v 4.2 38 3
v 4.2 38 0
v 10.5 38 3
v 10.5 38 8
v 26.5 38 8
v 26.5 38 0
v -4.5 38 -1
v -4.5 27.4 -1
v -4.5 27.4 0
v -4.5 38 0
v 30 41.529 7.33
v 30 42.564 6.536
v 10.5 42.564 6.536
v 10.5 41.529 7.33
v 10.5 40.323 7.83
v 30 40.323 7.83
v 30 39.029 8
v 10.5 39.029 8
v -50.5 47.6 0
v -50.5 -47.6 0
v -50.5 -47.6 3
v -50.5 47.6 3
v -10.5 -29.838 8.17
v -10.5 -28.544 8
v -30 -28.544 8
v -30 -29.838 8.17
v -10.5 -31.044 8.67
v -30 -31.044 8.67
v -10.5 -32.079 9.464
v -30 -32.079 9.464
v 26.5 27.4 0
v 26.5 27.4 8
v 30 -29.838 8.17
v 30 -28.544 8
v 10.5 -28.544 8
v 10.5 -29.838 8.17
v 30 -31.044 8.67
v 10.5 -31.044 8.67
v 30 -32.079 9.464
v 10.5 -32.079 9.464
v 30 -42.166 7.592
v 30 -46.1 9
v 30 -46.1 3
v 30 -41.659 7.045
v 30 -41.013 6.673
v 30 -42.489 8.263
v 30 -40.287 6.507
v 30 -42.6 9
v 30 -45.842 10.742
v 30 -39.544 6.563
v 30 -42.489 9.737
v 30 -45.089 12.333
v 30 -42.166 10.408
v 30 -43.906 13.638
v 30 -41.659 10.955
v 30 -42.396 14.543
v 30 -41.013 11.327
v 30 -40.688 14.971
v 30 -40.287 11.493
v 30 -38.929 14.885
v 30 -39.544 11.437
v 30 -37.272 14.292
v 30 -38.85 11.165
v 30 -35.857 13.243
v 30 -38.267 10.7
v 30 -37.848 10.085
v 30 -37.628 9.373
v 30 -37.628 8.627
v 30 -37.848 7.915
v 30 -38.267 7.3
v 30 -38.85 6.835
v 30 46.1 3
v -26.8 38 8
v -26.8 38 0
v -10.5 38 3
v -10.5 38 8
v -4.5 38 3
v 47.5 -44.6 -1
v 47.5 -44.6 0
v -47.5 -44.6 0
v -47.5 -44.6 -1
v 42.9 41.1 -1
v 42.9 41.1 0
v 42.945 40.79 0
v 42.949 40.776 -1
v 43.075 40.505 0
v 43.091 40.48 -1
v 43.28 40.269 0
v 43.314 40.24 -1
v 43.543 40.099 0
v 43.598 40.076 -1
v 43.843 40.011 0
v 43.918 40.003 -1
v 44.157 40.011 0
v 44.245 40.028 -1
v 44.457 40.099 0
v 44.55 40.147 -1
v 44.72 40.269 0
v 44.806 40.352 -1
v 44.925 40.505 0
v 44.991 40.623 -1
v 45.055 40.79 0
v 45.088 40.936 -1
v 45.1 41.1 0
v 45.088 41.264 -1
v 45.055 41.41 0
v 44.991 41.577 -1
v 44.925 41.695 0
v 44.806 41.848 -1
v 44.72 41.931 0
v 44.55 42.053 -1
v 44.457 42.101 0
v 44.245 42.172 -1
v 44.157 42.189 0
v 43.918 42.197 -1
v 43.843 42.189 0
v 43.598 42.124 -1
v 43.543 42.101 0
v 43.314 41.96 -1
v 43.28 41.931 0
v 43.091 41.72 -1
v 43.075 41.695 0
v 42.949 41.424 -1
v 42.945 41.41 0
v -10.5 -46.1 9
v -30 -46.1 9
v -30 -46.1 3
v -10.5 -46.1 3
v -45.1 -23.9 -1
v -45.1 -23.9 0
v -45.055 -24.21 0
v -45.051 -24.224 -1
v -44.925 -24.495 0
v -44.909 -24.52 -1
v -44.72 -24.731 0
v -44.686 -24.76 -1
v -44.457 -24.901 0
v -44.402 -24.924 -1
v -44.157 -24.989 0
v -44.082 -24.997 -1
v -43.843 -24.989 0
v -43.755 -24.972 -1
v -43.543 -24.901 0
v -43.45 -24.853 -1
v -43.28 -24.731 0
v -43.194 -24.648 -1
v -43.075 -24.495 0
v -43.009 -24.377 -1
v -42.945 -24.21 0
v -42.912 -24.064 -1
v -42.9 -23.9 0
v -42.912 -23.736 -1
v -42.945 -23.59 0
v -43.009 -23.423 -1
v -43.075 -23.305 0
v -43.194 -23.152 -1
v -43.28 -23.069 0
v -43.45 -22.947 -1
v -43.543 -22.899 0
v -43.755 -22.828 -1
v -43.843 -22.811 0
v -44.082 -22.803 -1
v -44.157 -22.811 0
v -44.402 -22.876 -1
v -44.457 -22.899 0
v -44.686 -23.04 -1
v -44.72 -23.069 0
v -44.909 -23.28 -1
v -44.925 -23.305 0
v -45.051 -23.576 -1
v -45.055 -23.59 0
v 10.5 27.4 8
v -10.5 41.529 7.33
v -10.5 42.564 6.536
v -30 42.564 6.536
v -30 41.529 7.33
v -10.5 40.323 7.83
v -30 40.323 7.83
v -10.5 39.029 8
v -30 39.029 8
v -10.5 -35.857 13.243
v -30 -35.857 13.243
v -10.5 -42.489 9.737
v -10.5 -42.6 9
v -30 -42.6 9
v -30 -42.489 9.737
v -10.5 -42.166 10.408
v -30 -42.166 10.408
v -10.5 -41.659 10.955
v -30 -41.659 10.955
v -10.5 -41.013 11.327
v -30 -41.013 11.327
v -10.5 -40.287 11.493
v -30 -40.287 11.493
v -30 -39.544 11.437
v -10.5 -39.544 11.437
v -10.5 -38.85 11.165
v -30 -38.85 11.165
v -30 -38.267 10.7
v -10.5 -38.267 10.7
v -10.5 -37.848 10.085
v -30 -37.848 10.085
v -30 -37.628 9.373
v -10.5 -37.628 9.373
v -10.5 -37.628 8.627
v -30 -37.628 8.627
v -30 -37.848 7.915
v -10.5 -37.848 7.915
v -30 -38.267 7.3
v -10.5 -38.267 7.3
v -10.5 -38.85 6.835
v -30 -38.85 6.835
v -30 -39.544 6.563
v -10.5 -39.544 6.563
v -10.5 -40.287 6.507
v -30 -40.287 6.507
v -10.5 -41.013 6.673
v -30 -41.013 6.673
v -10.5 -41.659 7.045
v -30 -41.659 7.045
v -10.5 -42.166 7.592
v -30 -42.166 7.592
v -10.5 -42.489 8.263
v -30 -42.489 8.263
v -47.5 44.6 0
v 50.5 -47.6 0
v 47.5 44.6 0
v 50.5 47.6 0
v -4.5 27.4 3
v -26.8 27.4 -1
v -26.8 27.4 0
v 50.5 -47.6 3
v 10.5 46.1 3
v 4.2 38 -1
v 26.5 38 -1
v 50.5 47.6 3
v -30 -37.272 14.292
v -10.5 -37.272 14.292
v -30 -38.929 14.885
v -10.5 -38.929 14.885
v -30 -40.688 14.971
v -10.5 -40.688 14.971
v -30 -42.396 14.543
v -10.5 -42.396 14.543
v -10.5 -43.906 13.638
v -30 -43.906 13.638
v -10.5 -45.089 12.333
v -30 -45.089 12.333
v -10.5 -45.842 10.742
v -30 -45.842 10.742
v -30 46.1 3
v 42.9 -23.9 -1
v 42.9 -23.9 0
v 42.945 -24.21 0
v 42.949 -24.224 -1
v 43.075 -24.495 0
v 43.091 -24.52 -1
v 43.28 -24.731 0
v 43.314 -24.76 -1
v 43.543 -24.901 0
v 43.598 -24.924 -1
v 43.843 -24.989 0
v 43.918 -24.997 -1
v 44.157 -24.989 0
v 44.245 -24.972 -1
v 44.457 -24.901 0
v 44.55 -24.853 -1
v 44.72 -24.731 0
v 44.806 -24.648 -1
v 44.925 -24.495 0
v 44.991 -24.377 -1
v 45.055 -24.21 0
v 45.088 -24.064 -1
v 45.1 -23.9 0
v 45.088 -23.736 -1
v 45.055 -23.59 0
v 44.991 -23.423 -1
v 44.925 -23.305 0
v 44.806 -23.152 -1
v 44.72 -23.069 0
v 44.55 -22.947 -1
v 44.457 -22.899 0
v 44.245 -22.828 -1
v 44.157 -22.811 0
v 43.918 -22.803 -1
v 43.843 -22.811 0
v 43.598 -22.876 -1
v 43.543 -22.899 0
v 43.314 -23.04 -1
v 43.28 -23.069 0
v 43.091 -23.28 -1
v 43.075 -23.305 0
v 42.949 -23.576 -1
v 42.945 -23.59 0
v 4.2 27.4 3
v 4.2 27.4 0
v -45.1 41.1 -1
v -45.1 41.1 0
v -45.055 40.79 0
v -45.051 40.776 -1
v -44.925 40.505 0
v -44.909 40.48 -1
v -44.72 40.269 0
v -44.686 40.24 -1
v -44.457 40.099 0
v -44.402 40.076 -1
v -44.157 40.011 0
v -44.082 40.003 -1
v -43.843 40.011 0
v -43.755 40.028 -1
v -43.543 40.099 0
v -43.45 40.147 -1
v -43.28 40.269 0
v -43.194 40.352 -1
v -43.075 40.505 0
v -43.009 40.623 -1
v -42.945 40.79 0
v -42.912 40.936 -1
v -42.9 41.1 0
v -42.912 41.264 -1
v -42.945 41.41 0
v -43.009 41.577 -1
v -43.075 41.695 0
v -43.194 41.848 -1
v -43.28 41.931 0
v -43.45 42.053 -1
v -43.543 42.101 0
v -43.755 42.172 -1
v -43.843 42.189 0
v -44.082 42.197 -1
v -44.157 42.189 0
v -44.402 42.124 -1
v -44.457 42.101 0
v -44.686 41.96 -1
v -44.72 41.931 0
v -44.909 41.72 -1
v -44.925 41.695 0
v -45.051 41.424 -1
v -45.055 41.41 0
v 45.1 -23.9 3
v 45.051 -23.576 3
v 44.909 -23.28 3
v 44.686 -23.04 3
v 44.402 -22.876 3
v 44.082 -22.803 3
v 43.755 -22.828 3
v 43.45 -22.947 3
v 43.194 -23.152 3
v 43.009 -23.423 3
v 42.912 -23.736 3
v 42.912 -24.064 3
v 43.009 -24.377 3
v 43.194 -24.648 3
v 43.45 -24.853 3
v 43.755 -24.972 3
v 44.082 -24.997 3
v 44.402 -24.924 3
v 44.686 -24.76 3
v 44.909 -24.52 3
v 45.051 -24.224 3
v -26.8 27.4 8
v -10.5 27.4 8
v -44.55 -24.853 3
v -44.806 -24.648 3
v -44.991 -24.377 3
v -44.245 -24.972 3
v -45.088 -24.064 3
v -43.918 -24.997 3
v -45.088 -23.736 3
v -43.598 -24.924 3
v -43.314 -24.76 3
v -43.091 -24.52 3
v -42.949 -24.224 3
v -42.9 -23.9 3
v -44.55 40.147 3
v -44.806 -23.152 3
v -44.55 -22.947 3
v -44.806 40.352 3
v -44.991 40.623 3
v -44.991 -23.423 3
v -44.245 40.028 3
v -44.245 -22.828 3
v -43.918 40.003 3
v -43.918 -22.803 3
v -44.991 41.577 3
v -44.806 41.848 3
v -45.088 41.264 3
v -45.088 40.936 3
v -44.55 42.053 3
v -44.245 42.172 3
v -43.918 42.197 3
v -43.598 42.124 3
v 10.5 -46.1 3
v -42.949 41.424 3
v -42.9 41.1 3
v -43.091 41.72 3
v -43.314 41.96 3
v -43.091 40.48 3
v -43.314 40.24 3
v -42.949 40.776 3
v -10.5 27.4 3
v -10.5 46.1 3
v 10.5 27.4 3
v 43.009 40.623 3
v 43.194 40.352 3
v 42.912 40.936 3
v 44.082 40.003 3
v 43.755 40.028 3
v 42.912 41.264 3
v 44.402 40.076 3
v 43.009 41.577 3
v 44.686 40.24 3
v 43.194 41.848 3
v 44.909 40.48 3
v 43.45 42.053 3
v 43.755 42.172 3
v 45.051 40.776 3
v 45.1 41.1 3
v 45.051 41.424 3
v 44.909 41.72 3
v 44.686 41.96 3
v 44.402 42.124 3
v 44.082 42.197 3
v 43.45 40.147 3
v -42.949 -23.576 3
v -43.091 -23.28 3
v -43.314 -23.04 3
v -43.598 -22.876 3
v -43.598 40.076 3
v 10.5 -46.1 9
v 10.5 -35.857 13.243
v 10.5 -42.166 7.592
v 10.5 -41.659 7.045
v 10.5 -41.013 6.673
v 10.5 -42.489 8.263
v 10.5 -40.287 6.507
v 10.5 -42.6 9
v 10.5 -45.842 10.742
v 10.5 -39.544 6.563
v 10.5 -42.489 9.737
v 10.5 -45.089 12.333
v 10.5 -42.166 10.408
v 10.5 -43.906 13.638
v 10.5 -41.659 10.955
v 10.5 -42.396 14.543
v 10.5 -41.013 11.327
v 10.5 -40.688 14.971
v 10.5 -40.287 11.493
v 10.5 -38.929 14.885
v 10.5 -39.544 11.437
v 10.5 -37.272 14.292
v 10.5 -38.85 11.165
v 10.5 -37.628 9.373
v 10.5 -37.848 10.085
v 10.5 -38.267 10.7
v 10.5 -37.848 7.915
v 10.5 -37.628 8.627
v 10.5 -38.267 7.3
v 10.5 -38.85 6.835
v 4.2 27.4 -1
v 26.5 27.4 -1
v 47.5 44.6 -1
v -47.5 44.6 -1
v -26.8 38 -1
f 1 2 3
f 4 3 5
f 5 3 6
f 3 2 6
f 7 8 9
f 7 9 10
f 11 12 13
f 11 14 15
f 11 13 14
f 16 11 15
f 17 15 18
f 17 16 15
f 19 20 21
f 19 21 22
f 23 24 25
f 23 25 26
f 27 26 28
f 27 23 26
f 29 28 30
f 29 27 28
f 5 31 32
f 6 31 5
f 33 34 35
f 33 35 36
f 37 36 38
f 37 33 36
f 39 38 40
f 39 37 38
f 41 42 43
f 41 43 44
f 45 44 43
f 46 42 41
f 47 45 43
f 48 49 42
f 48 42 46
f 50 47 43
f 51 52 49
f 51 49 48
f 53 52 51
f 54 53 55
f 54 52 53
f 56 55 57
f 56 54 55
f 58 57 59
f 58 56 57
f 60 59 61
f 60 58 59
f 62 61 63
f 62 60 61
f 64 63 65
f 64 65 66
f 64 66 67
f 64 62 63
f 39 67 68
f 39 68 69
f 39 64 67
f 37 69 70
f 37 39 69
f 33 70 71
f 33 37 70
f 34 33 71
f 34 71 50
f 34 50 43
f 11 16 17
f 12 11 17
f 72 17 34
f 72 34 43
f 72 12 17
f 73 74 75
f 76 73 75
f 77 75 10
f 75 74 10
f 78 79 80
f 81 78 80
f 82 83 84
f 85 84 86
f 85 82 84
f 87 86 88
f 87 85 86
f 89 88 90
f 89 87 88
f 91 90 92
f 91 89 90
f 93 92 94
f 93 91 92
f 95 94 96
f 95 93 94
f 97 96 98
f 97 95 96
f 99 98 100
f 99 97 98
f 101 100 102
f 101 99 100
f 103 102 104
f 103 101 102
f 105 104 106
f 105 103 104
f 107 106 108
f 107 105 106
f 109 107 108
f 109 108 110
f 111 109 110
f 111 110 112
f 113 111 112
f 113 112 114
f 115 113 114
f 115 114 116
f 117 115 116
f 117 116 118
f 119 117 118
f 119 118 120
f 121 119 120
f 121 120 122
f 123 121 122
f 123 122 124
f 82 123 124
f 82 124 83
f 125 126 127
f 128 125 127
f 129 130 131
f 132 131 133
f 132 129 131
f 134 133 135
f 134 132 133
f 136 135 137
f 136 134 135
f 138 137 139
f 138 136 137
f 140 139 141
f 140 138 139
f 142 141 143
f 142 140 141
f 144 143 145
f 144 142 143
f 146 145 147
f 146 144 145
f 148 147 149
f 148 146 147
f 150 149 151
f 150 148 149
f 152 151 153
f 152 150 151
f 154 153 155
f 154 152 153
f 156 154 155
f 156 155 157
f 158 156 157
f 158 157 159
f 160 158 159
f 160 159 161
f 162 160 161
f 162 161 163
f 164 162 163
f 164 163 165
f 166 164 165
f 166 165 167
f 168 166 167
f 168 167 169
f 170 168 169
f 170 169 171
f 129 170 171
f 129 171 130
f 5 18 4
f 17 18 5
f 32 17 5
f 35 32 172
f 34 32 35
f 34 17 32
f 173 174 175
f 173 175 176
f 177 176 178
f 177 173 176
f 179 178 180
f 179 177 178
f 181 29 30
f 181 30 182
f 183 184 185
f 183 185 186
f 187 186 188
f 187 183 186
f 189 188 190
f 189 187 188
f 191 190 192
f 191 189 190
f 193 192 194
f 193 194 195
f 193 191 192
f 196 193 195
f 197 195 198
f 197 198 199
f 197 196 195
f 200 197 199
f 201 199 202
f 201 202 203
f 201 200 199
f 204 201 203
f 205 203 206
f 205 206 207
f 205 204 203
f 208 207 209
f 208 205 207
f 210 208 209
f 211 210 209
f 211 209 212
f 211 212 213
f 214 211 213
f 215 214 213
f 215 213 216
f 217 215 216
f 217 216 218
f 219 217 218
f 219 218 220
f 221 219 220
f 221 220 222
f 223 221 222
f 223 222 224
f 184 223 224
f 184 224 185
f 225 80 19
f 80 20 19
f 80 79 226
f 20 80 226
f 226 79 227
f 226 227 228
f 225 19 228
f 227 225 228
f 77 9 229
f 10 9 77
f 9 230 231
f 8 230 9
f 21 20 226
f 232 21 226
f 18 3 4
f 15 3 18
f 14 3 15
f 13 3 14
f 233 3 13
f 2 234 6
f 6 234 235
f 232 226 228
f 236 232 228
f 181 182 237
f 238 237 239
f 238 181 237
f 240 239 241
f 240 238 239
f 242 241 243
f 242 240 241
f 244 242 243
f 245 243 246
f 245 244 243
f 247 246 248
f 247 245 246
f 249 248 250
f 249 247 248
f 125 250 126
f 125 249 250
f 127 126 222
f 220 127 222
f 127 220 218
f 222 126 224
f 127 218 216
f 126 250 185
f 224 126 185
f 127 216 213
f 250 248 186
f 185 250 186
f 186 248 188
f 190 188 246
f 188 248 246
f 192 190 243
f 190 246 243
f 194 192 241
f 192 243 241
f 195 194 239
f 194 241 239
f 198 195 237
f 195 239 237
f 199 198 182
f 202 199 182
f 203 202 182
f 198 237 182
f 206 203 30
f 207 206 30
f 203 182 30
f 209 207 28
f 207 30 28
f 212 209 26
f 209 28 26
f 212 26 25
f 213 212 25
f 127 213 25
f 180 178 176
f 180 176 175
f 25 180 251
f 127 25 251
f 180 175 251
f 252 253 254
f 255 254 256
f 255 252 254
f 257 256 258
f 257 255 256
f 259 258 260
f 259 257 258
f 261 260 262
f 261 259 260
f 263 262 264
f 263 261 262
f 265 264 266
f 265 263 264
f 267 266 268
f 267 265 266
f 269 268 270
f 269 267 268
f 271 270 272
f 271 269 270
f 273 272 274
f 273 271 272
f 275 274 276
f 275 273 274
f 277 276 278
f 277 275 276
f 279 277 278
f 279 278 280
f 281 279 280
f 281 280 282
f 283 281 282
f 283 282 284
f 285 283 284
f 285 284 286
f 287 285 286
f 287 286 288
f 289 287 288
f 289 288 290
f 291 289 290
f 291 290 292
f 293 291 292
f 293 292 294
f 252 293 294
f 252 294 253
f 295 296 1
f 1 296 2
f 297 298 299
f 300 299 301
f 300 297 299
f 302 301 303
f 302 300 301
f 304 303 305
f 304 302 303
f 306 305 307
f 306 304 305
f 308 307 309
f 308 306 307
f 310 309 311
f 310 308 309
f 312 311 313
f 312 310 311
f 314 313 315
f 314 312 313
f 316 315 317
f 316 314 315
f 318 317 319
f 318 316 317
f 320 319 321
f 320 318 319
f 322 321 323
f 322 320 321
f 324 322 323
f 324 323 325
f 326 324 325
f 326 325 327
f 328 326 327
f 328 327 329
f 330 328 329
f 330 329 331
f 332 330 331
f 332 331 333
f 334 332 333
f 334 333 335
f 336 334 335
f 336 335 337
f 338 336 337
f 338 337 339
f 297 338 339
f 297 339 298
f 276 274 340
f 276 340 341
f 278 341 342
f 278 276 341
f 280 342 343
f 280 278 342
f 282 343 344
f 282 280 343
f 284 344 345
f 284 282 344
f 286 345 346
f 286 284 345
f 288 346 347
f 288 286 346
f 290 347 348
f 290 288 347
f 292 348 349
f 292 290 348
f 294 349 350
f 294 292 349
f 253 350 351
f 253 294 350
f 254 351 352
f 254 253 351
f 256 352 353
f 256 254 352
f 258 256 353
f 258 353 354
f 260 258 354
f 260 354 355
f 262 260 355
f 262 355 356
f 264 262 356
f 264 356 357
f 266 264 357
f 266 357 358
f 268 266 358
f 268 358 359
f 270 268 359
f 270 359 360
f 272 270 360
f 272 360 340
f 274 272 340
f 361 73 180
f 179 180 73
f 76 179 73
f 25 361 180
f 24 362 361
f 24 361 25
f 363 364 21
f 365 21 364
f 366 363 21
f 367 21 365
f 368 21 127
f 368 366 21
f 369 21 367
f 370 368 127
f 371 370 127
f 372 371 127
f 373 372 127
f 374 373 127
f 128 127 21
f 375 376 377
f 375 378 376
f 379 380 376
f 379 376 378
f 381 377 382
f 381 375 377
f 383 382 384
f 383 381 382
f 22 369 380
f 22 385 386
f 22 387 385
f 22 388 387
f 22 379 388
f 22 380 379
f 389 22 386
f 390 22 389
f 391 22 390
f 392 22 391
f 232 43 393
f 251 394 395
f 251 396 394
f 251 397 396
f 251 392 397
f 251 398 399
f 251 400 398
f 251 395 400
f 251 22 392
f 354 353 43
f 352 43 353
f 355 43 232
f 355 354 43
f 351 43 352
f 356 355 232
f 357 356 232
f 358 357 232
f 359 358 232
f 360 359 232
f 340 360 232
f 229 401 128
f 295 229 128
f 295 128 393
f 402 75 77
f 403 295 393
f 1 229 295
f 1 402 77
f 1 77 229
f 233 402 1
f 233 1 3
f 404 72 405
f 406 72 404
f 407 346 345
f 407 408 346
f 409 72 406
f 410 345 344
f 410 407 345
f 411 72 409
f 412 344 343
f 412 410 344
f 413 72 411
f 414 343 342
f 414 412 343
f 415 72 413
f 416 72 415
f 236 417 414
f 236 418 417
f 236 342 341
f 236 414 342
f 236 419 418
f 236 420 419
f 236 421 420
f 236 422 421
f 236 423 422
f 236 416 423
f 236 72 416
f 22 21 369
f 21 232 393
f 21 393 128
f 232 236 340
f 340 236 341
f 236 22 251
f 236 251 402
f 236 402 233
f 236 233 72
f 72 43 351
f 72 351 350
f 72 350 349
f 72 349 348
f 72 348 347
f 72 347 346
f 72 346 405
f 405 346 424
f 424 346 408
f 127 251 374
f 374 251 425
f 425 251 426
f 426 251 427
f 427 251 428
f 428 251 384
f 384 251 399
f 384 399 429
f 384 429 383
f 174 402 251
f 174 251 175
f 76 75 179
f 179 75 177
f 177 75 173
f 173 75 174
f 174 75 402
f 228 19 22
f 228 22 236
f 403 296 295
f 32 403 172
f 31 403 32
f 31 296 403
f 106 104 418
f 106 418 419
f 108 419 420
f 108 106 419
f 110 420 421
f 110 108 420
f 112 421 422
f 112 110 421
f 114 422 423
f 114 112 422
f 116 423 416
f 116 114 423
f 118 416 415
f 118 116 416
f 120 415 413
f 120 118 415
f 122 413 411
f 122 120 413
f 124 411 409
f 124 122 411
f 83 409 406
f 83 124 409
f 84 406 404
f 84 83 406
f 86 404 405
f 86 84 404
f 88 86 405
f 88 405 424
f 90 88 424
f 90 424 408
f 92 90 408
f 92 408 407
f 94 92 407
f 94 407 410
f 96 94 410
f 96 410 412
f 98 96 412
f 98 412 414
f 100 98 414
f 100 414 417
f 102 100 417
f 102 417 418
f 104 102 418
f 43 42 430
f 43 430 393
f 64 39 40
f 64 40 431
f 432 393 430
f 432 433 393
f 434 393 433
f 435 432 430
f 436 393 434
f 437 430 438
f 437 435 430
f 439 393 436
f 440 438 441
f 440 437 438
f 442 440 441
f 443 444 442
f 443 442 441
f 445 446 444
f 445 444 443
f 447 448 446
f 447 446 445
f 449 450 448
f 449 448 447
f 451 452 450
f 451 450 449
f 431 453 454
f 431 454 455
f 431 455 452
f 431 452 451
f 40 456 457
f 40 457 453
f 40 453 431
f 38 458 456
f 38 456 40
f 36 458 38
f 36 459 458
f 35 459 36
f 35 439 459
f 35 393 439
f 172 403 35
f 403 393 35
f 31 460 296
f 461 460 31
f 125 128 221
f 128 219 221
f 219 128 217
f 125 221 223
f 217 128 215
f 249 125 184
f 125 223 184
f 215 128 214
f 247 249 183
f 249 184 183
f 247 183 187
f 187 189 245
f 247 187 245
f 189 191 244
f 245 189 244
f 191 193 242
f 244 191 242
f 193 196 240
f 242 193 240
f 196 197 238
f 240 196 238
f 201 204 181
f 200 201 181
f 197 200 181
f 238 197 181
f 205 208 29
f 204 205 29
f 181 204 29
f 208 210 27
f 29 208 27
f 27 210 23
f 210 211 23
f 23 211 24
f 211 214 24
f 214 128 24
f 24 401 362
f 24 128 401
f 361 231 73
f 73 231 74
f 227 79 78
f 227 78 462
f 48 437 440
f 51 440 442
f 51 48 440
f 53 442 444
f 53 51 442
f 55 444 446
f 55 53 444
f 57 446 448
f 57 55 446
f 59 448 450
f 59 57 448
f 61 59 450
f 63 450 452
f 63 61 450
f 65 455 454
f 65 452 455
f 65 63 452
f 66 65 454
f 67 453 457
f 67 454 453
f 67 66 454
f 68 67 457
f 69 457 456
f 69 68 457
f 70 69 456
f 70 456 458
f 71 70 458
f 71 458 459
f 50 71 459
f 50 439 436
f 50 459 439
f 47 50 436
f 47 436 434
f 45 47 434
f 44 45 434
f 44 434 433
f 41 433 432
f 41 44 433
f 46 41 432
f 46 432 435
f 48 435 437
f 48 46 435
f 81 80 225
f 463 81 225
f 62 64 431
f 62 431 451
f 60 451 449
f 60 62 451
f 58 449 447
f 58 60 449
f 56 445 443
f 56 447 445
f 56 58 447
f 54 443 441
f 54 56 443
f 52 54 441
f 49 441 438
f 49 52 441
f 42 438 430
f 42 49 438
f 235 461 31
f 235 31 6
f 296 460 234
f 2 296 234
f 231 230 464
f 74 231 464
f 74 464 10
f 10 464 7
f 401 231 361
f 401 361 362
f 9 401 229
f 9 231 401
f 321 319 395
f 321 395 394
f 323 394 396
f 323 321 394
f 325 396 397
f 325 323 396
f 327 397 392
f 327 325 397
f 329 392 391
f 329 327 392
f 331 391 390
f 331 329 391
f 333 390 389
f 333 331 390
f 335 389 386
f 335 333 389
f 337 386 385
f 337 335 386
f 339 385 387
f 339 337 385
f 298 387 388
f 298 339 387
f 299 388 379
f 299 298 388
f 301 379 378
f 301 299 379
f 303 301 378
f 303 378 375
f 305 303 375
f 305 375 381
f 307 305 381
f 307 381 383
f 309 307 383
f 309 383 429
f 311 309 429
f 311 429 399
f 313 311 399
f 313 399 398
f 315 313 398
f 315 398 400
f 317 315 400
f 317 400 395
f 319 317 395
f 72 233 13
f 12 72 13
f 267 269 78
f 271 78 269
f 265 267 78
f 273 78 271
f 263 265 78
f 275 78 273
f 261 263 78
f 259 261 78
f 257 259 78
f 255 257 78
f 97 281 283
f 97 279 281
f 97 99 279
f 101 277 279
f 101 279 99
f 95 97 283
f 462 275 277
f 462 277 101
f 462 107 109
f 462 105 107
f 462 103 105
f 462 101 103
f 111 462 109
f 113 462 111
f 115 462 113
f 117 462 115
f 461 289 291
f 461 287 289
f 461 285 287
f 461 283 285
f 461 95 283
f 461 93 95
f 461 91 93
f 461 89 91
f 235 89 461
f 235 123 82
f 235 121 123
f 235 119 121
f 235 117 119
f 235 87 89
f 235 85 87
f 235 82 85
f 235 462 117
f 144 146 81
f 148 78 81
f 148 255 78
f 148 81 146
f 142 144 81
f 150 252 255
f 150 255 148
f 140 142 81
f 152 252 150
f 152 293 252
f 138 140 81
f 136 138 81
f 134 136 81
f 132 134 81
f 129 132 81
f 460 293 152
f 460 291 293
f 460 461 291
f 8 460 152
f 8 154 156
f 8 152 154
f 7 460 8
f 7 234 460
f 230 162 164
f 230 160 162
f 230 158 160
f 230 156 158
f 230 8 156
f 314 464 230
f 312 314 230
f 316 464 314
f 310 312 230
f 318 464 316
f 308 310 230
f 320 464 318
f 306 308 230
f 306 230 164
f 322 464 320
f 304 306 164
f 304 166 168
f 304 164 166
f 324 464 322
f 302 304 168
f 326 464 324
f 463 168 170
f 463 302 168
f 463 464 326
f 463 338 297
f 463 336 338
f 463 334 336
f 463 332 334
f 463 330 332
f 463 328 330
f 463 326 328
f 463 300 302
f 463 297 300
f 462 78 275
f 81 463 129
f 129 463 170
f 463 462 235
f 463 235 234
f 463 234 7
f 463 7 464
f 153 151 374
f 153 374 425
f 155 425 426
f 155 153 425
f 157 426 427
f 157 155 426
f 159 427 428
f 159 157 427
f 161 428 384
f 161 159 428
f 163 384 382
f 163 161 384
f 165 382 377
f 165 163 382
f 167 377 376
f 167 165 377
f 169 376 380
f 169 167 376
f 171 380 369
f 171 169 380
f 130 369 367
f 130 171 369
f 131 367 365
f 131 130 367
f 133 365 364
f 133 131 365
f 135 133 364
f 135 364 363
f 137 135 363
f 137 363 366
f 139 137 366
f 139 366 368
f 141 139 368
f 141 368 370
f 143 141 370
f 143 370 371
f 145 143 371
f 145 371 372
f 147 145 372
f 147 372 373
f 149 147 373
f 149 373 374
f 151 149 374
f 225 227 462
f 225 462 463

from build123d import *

# Parameters (mm, degrees)
SKETCH1_W                = 101
SKETCH1_H                = 95.2
SKETCH1_R                = 1.1
SKETCH1_W_2              = 22.3
SKETCH1_H_2              = 10.6
BOSS_EXTRUDE1_DEPTH      = 3
BOSS_EXTRUDE3_DEPTH      = 30
BOSS_EXTRUDE3_DEPTH_BACK = 30
SKETCH5_R                = 2.5
CUT_EXTRUDE1_START       = -40.5
CUT_EXTRUDE1_DEPTH       = 21
SKETCH9_W                = 22.3
SKETCH9_H                = 10.6
CUT_EXTRUDE4_DEPTH       = 10
SKETCH10_W               = 95
SKETCH10_H               = 89.2
BOSS_EXTRUDE4_DEPTH      = 1
CUT_EXTRUDE5_START       = -1.2
SKETCH11_R               = 1.1
SKETCH11_W               = 22.3
SKETCH11_H               = 10.6
CUT_EXTRUDE5_DEPTH       = 1.2


with BuildPart() as part:
    # Sketch1 → Boss-Extrude1 (new body)
    with BuildSketch(Plane.XY):
        Rectangle(SKETCH1_W, SKETCH1_H)
        with Locations((44, 41.1)):
            Circle(SKETCH1_R, mode=Mode.SUBTRACT)
        with Locations((44, -23.9)):
            Circle(SKETCH1_R, mode=Mode.SUBTRACT)
        with Locations((-44, 41.1)):
            Circle(SKETCH1_R, mode=Mode.SUBTRACT)
        with Locations((-44, -23.9)):
            Circle(SKETCH1_R, mode=Mode.SUBTRACT)
        with Locations((-15.65, 32.7)):
            Rectangle(SKETCH1_W_2, SKETCH1_H_2, mode=Mode.SUBTRACT)
        with Locations((15.35, 32.7)):
            Rectangle(SKETCH1_W_2, SKETCH1_H_2, mode=Mode.SUBTRACT)
    extrude(amount=BOSS_EXTRUDE1_DEPTH)

    # Sketch5 → Boss-Extrude3 (add, two sides: drawn at the far end of the back side and taken through both)
    with BuildSketch(Plane(origin=(0, 0, 0), x_dir=(0, -1, 0), z_dir=(-1, 0, 0)).offset(-BOSS_EXTRUDE3_DEPTH_BACK)):
        with BuildLine():
            Line((46.1, 9), (46.1, 3))
            Line((46.1, 3), (25.614718626, 3))
            Line((25.614718626, 3), (-46.1, 3))
            Line((-46.1, 3), (-42.564466094, 6.535533906))
            ThreePointArc((-42.564466094, 6.535533906), (-40.94234935, 7.619397663), (-39.028932188, 8))
            Line((-39.028932188, 8), (28.543650814, 8))
            ThreePointArc((28.543650814, 8), (30.457067976, 8.380602337), (32.07918472, 9.464466094))
            Line((32.07918472, 9.464466094), (35.857359313, 13.242640687))
            ThreePointArc((35.857359313, 13.242640687), (42.396100594, 14.543277195), (46.1, 9))
        make_face()
        with Locations((40.1, 9)):
            Circle(SKETCH5_R, mode=Mode.SUBTRACT)
    extrude(amount=BOSS_EXTRUDE3_DEPTH + BOSS_EXTRUDE3_DEPTH_BACK)

    # Sketch7 → Cut-Extrude1 (cut)
    with BuildSketch(Plane.ZY.offset(30).offset(CUT_EXTRUDE1_START)):
        with BuildLine():
            Line((3, 46.1), (3, -46.1))
            Line((3, -46.1), (9, -46.1))
            ThreePointArc((9, -46.1), (14.543277195, -42.396100594), (13.242640687, -35.857359313))
            Line((13.242640687, -35.857359313), (9.464466094, -32.07918472))
            ThreePointArc((9.464466094, -32.07918472), (8.380602337, -30.457067976), (8, -28.543650814))
            Line((8, -28.543650814), (8, 39.028932188))
            ThreePointArc((8, 39.028932188), (7.619397663, 40.94234935), (6.535533906, 42.564466094))
            Line((6.535533906, 42.564466094), (3, 46.1))
        make_face()
    extrude(amount=CUT_EXTRUDE1_DEPTH, mode=Mode.SUBTRACT)

    # Sketch9 → Cut-Extrude4 (cut)
    with BuildSketch(Plane.XY.offset(3)):
        with Locations((15.35, 32.7)):
            Rectangle(SKETCH9_W, SKETCH9_H)
        with Locations((-15.65, 32.7)):
            Rectangle(SKETCH9_W, SKETCH9_H)
    extrude(amount=CUT_EXTRUDE4_DEPTH, mode=Mode.SUBTRACT)

    # Sketch10 → Boss-Extrude4 (add)
    with BuildSketch(Plane(origin=(0, 0, 0), x_dir=(-1, 0, 0), z_dir=(0, 0, -1))):
        Rectangle(SKETCH10_W, SKETCH10_H)
    extrude(amount=BOSS_EXTRUDE4_DEPTH)

    # Sketch11 → Cut-Extrude5 (cut)
    with BuildSketch(Plane.XY.offset(CUT_EXTRUDE5_START)):
        with Locations(Location((-44, 41.1, 0), (0, 0, 180))):
            Circle(SKETCH11_R)
        with Locations(Location((-44, -23.9, 0), (0, 0, 180))):
            Circle(SKETCH11_R)
        with Locations(Location((44, -23.9, 0), (0, 0, 180))):
            Circle(SKETCH11_R)
        with Locations(Location((44, 41.1, 0), (0, 0, 180))):
            Circle(SKETCH11_R)
        with Locations((15.35, 32.7)):
            Rectangle(SKETCH11_W, SKETCH11_H)
        with Locations((-15.65, 32.7)):
            Rectangle(SKETCH11_W, SKETCH11_H)
    extrude(amount=CUT_EXTRUDE5_DEPTH, mode=Mode.SUBTRACT)


solid = part.part
